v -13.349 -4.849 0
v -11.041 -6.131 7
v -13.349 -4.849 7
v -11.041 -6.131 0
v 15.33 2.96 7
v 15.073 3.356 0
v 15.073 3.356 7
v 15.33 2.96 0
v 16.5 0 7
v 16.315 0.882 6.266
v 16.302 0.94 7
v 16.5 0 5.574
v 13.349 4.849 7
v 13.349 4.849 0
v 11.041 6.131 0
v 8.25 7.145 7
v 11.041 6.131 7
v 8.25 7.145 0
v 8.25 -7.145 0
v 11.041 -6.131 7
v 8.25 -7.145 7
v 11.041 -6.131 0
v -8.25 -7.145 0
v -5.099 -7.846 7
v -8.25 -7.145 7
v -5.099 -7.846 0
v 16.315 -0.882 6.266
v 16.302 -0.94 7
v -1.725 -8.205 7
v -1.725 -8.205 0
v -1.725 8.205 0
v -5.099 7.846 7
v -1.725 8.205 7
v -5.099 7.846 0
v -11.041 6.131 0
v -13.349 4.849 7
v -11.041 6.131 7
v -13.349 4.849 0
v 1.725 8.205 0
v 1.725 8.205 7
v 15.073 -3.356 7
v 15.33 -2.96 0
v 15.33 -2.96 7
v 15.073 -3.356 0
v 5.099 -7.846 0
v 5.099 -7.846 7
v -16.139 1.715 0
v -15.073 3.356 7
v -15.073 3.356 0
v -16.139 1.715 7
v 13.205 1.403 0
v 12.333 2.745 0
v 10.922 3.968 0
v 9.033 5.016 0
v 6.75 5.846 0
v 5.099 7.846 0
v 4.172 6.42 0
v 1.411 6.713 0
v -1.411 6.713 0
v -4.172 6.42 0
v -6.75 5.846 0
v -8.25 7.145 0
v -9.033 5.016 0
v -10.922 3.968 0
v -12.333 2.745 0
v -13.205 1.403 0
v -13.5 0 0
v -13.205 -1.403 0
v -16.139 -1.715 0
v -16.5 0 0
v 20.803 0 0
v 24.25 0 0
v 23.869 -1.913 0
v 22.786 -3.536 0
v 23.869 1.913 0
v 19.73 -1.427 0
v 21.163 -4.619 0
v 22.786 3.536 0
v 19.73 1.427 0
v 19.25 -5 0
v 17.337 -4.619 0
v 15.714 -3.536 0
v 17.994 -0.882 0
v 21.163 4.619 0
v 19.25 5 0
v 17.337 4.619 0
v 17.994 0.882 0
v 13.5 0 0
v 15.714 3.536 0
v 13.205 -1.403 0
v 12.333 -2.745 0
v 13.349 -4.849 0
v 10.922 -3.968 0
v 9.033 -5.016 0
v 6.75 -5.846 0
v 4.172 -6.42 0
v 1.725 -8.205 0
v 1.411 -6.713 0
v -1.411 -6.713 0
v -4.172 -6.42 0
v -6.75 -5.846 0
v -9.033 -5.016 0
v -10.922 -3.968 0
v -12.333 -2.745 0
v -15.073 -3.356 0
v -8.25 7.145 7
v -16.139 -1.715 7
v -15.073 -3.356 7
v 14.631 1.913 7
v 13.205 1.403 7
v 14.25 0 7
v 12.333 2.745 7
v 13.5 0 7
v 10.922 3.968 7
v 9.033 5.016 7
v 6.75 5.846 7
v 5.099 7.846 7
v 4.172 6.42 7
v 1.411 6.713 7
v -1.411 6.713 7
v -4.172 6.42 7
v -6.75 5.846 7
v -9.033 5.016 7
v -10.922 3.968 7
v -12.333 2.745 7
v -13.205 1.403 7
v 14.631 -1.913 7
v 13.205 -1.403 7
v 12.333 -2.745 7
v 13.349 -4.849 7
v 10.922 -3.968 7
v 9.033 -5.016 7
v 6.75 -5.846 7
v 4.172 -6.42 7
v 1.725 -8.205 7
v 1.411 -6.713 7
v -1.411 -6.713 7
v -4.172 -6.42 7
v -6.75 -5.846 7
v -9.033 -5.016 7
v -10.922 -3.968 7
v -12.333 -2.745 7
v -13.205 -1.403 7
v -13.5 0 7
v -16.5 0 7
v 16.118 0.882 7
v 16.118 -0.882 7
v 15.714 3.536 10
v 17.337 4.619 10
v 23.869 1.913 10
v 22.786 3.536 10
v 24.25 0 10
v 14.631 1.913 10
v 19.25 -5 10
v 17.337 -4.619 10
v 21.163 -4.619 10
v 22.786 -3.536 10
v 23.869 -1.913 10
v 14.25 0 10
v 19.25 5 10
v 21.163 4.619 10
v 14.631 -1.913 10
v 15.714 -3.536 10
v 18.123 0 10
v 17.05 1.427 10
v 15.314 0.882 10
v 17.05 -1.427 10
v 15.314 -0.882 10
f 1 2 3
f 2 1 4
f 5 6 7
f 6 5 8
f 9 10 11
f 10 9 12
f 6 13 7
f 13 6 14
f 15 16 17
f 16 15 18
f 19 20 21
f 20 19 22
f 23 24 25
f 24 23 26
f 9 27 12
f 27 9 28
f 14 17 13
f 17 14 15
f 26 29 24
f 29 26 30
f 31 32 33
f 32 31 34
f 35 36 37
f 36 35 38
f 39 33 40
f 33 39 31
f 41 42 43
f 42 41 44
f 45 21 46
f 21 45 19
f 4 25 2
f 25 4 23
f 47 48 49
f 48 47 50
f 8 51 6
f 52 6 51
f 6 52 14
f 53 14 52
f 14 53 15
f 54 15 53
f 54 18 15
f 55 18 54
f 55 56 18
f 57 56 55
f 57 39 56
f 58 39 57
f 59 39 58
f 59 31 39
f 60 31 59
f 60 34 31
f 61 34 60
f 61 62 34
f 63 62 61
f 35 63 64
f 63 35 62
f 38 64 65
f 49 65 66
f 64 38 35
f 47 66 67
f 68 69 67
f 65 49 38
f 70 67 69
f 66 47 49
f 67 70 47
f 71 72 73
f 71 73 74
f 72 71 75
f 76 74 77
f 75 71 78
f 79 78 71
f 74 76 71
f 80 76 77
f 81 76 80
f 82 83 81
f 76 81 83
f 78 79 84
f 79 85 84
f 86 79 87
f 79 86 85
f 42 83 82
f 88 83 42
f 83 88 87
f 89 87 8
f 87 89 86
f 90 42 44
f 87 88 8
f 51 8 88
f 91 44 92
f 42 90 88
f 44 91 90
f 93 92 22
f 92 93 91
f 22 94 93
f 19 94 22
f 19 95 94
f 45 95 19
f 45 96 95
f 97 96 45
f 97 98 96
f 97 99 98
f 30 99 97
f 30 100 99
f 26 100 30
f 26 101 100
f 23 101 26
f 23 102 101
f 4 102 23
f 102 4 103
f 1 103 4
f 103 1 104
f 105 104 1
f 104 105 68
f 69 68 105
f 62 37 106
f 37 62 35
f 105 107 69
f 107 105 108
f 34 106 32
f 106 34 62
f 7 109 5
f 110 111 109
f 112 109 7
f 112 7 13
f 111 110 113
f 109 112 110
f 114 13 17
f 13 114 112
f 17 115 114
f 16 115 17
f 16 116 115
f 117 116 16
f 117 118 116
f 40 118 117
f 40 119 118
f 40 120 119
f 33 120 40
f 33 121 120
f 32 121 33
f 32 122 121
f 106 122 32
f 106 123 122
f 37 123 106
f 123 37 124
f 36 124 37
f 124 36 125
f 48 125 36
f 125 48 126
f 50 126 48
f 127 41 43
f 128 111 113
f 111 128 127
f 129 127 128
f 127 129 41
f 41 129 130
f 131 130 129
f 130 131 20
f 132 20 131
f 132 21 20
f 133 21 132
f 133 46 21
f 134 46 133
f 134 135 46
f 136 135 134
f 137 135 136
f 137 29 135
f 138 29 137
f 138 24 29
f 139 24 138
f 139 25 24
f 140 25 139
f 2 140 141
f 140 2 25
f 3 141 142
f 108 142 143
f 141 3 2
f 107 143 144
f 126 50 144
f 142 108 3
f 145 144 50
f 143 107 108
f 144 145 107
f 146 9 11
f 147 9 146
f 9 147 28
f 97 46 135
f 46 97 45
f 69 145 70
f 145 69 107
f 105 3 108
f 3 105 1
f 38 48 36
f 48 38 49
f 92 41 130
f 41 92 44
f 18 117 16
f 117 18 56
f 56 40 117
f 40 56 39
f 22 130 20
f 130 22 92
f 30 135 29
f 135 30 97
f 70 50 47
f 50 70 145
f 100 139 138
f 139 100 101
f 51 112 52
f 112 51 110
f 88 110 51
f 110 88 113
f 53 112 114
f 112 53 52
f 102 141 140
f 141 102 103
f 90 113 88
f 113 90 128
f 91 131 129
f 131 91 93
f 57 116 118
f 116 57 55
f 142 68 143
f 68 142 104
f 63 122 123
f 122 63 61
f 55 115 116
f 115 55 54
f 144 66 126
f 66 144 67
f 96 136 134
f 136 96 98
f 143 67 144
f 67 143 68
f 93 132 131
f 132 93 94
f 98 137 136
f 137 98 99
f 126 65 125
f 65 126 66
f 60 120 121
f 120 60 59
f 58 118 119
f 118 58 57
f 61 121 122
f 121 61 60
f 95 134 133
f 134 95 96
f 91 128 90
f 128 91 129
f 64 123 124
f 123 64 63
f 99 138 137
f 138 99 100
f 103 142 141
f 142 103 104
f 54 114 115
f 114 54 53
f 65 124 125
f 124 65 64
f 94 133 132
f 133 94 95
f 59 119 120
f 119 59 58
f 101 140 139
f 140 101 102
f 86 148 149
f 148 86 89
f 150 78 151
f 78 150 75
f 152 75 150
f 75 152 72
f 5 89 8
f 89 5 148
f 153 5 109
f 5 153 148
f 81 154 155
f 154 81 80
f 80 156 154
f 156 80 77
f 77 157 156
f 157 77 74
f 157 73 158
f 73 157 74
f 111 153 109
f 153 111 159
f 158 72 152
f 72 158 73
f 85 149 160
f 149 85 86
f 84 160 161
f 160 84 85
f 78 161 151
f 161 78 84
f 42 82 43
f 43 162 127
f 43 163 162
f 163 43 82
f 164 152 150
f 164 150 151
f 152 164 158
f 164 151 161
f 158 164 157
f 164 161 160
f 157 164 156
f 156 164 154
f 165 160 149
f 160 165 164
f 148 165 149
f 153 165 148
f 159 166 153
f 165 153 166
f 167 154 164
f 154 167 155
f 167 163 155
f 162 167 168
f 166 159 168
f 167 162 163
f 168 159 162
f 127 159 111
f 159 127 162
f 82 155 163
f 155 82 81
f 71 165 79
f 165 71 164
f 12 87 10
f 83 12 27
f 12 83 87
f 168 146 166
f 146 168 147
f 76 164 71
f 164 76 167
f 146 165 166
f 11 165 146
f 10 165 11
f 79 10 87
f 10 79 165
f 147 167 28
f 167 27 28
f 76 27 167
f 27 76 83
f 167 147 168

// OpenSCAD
bic_radius = 13.5;

// make that true to add screw holders on the side
sides = false;

module oval(height, radius) {
 // oval is a scaled cylinder
 scale([1,0.5])
   cylinder(h=height, r1=radius, r2=radius, center=false);
}

// screw hole
module screw_hole(radius, angle){
  rotate([0, -angle, 0])
    translate([0,0,-10])
    cylinder(h=30, r1=radius, r2=radius);
}

module bic_ring(height) {
  // bic ring
  difference() {
    oval(7, bic_radius + 3);
    translate([0,0,-1])
      oval(height, bic_radius);
  }
}


module screw_holder(height, angle ) {
  // end roll
  difference() 
  {
    cylinder(h=height, r1=5, r2=5);
    {
      // cut cylinder bottom
      translate([0, 0,0]) {
        screw_hole(1.5, angle=angle);
      }
    }
  }
}



// build
bic_ring(height=20);

// front
translate([bic_radius + 5.75, 0, 0]) 
{
  screw_holder(height=10, angle=15);
}

if (sides) {
  // side 1
  translate([0, -bic_radius + 1.75, 0]) 
  {
    rotate([0,0, -90])  
      screw_holder(height=10, angle=15);
  }

  // side 2
  translate([0, bic_radius - 1.75, 0]) 
  {
    rotate([0,0,90])  
      screw_holder(height=10, angle=15);
  }
}
